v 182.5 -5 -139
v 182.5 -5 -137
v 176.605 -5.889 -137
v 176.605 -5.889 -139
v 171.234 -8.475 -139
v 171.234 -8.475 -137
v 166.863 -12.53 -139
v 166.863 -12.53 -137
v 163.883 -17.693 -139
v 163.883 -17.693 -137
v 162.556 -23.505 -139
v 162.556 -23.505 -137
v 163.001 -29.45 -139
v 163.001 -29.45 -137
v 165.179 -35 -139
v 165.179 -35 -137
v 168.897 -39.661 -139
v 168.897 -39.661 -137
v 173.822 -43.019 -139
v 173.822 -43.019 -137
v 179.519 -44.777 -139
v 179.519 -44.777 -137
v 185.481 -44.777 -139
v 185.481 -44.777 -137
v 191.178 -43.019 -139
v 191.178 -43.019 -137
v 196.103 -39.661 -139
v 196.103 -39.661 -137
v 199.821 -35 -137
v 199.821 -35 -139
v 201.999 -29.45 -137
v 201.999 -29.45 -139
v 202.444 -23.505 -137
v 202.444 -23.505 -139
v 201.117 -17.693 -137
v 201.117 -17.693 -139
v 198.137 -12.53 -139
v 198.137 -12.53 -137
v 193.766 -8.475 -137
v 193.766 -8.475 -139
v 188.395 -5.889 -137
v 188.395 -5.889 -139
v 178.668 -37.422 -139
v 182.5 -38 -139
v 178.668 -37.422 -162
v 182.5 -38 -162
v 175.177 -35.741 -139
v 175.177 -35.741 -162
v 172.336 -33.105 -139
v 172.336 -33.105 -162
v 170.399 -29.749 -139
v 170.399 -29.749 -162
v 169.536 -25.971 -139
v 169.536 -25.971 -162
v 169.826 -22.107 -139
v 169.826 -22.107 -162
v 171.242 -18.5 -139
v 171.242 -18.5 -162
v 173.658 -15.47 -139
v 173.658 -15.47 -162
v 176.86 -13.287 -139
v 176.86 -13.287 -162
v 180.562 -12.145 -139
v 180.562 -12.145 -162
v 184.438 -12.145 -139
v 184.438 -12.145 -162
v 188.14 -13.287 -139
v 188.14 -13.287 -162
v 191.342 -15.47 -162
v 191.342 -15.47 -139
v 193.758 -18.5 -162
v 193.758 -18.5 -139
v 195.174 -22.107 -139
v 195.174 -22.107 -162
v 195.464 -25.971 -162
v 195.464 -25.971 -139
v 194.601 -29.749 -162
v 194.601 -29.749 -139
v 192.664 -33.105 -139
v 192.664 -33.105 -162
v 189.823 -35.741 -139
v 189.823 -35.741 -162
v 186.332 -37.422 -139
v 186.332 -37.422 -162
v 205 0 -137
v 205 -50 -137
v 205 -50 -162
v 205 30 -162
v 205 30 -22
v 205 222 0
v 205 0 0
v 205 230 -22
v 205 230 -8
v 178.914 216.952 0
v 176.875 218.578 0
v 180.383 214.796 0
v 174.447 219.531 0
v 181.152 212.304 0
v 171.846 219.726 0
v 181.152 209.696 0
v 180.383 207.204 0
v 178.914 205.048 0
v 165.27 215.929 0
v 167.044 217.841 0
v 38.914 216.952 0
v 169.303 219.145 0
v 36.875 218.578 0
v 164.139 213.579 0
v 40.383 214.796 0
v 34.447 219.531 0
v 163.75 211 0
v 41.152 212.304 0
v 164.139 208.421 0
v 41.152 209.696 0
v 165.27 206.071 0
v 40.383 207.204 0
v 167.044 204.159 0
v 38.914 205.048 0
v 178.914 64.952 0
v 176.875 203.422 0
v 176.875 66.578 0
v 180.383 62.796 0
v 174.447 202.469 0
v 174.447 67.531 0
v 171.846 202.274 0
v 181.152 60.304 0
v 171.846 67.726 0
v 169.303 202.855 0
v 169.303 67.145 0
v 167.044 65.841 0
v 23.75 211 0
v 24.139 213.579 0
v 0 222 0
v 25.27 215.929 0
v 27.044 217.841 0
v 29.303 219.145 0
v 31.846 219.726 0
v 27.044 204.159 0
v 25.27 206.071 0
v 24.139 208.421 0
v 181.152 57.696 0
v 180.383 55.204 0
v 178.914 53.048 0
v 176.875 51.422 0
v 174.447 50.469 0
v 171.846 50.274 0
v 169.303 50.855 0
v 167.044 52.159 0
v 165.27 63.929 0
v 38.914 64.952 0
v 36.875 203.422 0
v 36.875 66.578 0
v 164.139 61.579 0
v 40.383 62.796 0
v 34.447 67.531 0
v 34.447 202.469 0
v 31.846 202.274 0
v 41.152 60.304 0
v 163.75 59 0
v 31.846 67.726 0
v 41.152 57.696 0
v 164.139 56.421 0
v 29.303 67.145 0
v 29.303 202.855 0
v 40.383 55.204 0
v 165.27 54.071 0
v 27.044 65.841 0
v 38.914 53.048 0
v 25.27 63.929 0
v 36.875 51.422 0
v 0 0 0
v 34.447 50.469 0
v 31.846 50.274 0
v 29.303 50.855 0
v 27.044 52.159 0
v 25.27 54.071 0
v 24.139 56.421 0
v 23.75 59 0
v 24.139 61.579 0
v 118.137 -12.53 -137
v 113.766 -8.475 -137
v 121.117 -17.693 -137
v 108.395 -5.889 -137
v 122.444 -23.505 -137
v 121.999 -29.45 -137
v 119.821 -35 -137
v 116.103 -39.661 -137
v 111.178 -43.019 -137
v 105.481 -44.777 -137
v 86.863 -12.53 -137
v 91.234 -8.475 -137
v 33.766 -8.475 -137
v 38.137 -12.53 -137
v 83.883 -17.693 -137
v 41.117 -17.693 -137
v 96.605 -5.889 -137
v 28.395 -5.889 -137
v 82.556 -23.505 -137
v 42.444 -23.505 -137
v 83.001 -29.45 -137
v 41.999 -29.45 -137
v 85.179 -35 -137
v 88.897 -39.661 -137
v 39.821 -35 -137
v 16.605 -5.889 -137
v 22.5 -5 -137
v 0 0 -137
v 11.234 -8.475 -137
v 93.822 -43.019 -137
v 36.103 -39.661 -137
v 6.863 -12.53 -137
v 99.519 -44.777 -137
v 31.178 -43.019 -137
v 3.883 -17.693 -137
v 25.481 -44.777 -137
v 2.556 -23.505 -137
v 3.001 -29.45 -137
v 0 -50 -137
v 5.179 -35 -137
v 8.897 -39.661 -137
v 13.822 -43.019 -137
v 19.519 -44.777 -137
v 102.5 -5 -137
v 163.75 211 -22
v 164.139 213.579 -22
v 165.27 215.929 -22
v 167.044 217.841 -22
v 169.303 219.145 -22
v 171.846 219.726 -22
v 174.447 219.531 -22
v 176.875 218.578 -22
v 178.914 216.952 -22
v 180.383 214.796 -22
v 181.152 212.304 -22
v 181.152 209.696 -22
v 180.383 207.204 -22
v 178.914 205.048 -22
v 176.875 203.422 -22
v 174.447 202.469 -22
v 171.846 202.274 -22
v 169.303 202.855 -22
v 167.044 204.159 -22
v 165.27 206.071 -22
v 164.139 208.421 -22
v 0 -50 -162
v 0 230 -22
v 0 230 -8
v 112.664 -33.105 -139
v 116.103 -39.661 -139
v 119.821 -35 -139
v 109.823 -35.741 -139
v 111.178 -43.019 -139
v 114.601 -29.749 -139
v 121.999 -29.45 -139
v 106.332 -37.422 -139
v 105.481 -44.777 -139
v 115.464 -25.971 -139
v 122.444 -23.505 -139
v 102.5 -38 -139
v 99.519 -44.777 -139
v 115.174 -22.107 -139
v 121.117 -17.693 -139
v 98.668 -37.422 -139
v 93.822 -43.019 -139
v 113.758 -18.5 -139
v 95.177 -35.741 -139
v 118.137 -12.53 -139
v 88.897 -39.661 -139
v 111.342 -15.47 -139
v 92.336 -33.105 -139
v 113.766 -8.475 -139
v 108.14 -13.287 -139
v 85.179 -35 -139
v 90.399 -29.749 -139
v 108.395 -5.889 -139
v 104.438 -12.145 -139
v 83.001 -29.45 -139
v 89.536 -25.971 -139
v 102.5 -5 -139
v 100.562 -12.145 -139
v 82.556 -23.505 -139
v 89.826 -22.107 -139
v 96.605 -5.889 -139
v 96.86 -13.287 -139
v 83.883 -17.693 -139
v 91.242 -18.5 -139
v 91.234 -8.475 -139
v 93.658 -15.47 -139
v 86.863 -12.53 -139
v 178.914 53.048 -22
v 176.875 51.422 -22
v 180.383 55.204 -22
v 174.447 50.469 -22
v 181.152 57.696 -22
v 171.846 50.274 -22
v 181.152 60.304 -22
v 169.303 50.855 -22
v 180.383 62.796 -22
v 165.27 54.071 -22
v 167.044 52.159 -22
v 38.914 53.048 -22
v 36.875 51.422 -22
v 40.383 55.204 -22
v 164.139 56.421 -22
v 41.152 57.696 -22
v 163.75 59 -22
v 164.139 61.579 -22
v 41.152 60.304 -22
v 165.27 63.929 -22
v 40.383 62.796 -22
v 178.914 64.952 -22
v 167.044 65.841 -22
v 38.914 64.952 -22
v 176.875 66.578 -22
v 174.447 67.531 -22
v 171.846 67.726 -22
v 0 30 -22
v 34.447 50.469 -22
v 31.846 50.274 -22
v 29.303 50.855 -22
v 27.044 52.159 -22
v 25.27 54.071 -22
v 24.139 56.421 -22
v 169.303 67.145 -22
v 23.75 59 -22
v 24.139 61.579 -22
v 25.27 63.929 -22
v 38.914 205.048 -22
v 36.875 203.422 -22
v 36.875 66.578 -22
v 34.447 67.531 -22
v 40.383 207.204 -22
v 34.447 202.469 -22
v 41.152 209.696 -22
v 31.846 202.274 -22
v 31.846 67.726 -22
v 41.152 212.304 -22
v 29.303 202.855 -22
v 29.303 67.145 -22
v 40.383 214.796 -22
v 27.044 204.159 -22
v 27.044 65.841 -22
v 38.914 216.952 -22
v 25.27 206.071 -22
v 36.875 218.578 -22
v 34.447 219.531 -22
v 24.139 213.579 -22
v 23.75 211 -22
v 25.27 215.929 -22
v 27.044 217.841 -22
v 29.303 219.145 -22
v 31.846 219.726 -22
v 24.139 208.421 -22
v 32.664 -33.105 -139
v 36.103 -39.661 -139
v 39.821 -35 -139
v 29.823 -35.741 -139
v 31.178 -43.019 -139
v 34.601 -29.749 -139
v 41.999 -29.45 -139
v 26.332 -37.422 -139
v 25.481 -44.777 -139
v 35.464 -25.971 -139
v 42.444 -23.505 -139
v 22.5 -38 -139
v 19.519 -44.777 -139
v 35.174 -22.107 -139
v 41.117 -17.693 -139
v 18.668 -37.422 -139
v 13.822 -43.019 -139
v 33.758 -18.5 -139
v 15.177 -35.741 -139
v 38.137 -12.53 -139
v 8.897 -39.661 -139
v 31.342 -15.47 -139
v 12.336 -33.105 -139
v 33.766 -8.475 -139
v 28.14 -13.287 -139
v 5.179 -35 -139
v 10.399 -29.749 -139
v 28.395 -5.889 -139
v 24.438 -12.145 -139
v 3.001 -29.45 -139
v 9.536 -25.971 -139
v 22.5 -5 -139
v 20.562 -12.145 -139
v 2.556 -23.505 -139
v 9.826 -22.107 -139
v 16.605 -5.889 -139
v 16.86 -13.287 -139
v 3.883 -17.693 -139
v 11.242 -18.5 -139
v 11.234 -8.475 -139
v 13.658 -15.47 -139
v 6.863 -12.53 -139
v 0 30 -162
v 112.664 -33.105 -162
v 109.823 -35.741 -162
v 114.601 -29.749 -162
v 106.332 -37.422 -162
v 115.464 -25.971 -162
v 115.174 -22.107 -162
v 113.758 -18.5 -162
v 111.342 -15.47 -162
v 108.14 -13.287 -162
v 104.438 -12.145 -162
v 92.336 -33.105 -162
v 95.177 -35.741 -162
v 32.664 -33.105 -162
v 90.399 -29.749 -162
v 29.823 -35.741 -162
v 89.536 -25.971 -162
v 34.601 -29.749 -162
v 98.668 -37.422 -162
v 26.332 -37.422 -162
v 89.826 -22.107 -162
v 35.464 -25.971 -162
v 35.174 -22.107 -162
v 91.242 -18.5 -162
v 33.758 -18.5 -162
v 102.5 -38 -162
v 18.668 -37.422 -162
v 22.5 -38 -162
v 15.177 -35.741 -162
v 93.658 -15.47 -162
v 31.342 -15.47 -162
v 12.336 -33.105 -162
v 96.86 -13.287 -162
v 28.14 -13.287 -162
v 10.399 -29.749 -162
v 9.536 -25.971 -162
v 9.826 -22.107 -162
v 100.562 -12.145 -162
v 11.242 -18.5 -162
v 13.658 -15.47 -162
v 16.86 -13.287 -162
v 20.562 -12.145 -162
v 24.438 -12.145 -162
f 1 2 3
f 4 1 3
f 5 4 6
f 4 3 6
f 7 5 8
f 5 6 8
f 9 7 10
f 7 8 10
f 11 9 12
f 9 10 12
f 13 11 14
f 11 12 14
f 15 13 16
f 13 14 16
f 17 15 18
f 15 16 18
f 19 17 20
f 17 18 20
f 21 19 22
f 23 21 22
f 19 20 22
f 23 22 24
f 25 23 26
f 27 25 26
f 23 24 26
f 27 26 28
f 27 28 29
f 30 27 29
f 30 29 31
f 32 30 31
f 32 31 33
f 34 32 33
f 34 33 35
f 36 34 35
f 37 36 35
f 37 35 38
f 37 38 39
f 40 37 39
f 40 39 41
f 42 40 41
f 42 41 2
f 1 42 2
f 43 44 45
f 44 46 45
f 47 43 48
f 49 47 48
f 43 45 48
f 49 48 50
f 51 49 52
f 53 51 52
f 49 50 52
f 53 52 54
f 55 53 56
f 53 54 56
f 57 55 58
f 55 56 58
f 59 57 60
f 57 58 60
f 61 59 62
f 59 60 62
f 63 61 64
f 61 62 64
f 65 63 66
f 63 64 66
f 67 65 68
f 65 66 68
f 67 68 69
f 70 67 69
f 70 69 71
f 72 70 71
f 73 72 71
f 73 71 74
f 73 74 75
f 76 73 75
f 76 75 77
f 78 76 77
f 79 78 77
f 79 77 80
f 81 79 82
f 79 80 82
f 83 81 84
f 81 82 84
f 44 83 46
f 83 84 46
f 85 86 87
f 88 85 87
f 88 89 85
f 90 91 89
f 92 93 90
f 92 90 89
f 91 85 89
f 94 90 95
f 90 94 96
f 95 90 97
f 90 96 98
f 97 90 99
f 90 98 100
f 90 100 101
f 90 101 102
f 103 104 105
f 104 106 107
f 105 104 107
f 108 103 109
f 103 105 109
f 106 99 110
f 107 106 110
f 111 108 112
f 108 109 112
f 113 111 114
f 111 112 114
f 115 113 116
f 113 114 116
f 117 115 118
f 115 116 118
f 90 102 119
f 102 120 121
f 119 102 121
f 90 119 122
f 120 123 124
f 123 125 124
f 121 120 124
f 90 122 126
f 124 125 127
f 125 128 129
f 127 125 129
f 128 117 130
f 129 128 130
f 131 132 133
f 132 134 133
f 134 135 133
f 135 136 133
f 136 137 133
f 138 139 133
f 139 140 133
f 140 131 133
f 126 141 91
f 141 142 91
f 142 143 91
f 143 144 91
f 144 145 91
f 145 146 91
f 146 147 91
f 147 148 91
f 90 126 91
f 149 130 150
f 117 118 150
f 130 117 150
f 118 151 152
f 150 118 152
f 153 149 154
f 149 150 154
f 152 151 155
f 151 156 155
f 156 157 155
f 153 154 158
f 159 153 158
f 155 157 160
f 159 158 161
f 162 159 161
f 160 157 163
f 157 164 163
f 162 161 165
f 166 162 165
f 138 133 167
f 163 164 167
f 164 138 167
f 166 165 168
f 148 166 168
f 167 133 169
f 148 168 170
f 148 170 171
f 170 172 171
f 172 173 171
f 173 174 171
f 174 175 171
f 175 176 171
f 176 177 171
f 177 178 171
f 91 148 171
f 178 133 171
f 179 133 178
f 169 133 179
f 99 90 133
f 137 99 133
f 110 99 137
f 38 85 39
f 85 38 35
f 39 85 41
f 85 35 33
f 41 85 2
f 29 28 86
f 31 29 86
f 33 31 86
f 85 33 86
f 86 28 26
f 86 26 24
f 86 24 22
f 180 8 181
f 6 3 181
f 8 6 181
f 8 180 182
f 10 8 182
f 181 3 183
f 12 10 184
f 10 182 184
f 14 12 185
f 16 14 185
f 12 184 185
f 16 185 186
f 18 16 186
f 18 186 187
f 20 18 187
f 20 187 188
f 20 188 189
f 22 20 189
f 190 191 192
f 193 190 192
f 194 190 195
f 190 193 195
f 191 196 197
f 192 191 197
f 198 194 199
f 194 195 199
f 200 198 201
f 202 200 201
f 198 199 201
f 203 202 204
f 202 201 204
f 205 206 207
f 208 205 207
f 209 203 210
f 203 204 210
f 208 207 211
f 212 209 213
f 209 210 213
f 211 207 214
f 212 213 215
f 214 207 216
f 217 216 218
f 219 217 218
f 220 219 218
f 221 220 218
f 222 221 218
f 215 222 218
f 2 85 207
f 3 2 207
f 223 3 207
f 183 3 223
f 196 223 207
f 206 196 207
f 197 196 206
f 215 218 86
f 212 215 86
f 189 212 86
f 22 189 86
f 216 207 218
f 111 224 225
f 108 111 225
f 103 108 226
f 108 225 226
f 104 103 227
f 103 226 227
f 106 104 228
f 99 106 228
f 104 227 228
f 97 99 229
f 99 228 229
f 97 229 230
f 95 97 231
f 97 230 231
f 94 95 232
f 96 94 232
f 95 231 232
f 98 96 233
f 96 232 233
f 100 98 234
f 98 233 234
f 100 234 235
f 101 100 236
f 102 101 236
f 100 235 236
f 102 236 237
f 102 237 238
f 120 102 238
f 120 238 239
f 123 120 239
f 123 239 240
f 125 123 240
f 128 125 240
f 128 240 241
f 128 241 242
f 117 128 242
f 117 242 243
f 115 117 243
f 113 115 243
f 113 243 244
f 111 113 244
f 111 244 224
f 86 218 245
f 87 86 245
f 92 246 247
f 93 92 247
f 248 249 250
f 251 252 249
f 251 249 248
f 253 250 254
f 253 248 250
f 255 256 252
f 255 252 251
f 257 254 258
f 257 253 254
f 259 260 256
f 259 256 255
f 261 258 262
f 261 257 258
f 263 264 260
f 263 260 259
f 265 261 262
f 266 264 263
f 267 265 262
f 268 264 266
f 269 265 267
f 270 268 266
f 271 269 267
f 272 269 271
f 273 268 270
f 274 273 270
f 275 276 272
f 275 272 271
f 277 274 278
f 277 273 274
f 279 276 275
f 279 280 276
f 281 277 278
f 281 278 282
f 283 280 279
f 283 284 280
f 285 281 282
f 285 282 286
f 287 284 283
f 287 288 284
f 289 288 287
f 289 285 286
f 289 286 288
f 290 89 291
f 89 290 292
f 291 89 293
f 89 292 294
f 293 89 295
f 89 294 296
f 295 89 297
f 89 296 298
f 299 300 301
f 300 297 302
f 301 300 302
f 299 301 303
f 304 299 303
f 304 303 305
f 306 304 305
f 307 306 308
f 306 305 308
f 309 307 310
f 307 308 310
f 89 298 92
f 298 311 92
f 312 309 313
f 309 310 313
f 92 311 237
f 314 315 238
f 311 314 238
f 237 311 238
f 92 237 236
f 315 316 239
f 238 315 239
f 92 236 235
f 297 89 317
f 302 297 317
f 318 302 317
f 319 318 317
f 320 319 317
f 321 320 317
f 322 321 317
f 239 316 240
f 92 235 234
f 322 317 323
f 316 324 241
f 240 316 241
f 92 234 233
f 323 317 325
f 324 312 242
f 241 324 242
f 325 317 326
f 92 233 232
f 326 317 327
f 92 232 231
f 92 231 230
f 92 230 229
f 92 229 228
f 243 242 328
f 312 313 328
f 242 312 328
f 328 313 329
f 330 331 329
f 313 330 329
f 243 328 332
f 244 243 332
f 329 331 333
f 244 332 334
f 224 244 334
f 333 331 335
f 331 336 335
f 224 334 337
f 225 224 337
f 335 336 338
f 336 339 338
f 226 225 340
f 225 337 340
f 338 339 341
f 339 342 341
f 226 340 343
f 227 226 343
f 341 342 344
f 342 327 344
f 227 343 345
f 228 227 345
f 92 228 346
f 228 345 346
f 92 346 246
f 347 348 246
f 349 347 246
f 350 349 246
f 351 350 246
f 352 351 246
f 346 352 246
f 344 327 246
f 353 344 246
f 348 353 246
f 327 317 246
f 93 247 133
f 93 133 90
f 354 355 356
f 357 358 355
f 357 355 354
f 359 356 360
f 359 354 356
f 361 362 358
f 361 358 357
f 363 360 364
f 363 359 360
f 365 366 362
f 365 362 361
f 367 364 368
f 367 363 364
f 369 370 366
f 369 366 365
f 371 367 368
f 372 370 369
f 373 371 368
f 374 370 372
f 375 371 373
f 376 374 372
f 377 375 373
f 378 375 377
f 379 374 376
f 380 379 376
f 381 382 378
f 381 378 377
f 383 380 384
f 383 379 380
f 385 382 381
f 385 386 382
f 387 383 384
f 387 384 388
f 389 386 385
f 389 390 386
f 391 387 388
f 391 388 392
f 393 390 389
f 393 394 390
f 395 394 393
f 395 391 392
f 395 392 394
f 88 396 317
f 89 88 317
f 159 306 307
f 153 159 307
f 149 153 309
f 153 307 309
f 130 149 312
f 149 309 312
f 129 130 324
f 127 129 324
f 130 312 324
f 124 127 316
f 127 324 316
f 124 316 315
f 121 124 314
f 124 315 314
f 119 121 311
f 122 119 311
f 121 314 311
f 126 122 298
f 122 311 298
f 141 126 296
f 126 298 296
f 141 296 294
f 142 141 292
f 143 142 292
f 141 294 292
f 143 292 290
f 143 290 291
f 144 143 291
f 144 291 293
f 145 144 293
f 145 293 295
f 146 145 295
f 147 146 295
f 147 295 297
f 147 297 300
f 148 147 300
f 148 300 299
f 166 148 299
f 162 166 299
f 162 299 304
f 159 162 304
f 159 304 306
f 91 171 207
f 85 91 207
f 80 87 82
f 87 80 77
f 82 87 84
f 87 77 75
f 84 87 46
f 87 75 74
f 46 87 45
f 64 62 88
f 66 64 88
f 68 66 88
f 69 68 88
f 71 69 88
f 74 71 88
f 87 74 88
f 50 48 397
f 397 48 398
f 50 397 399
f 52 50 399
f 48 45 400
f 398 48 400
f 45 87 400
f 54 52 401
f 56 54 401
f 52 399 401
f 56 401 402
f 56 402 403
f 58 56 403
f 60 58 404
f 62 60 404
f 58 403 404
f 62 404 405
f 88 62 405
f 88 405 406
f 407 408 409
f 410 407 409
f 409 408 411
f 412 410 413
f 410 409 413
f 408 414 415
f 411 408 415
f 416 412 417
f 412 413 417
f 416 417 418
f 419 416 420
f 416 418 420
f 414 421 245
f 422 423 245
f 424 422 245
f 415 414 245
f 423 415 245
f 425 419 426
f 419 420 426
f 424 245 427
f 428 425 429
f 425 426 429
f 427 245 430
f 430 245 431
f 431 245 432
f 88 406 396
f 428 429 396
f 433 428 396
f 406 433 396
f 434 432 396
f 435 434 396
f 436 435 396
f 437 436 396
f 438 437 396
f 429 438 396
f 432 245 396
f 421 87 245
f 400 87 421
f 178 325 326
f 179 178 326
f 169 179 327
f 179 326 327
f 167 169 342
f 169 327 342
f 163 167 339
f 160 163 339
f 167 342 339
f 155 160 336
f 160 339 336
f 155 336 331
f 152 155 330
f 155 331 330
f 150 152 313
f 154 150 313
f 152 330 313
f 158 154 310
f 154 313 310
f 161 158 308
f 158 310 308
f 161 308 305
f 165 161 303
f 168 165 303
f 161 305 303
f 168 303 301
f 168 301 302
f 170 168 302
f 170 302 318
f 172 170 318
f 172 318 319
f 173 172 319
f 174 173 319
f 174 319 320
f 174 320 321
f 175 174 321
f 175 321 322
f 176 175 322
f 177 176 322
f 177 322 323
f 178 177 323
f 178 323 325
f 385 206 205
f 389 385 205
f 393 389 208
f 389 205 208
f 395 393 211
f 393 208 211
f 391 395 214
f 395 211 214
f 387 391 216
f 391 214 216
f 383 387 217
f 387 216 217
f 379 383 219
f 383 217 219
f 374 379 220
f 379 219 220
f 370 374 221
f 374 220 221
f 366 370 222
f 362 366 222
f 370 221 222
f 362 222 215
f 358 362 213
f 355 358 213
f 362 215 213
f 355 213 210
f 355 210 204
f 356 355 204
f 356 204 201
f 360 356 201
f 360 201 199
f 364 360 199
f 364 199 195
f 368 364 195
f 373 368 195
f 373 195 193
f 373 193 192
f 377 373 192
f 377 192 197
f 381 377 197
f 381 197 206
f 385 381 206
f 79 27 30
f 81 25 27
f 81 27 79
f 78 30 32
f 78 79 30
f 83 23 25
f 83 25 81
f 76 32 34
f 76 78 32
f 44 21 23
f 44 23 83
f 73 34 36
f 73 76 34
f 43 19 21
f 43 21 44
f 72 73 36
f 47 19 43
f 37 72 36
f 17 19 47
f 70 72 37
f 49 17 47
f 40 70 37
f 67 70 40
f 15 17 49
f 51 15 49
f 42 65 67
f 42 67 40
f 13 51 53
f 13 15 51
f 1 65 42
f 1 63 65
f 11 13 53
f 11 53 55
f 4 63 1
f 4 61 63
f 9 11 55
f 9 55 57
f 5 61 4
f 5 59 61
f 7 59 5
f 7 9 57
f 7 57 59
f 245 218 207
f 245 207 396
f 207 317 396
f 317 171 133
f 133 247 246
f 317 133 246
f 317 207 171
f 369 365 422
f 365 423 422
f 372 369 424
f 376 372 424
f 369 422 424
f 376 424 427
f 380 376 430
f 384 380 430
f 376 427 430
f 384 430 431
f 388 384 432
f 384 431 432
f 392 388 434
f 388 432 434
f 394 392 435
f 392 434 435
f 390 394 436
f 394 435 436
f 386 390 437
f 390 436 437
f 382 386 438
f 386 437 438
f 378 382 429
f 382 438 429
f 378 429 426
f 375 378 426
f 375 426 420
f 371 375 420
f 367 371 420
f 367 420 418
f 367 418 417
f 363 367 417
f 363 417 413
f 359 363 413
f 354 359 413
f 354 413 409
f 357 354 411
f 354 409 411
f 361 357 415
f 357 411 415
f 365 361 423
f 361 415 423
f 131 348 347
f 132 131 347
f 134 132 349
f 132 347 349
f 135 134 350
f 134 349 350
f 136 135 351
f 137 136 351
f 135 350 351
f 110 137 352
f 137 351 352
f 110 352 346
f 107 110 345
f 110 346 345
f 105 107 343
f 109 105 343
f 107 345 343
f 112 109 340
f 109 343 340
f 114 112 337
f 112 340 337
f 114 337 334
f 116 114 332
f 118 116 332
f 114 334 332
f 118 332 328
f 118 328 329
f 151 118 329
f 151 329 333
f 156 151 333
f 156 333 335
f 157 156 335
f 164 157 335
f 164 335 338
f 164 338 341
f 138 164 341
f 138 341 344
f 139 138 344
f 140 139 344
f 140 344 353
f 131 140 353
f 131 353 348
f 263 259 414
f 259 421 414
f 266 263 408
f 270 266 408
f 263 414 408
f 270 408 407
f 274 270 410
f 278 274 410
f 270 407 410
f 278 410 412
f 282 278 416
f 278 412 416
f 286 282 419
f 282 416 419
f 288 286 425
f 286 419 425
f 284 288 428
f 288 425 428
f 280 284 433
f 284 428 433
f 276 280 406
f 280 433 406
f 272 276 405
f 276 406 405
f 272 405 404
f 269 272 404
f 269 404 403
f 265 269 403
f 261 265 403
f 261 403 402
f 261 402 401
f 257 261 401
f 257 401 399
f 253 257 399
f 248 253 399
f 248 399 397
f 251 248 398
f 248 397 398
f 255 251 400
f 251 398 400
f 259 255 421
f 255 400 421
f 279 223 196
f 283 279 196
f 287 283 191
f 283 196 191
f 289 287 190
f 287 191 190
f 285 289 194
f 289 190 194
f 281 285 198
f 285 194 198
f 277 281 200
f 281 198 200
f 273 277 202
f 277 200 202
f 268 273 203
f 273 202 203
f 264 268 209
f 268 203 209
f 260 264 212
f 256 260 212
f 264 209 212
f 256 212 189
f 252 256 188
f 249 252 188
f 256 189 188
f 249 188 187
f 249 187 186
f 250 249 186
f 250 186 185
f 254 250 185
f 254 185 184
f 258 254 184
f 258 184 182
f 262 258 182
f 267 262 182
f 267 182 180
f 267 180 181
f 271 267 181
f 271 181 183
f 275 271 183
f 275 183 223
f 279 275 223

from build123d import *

# Parameters (mm, degrees)
EXTRUDE_1_DEPTH                 = 205
HOLE_WIZARD_M20_1_D             = 17.5
PATTERN_LINEAR_1_COUNT          = 2
PATTERN_LINEAR_1_PITCH          = 140
PATTERN_LINEAR_1_COUNT_DIR2     = 2
PATTERN_LINEAR_1_PITCH_DIR2     = 152
HOLE_WIZARD_M20_1_2_D           = 26
HOLE_WIZARD_M20_1_2_CBORE_D     = 40
HOLE_WIZARD_M20_1_2_CBORE_DEPTH = 2
PATTERN_LINEAR_2_COUNT          = 3
PATTERN_LINEAR_2_PITCH          = 80
CHAMFER_1_SIZE                  = 8


with BuildPart() as part:
    # 草图1 → 凸台-拉伸1 (new body)
    with BuildSketch(Plane(origin=(0, 0, 0), x_dir=(0, 0, -1), z_dir=(1, 0, 0))):
        Polygon((0, 0), (137, 0), (137, -50), (162, -50), (162, 30), (22, 30), (22, 230), (0, 230), align=None)
    extrude(amount=EXTRUDE_1_DEPTH)

    # Hole Wizard M20 _1 (through all)
    with Locations(Plane(origin=(32.5, 211, 0), x_dir=(1, 0, 0), z_dir=(0, 0, 1))):
        with Locations((0, 0)):
            hole_wizard_m20_1 = Hole(HOLE_WIZARD_M20_1_D / 2)

    # 阵列(线性)1: Hole Wizard M20 _1 2 × 2
    with Locations(*[(i * PATTERN_LINEAR_1_PITCH, -j * PATTERN_LINEAR_1_PITCH_DIR2, 0) for i in range(PATTERN_LINEAR_1_COUNT) for j in range(PATTERN_LINEAR_1_COUNT_DIR2) if (i, j) != (0, 0)]):
        add(hole_wizard_m20_1, mode=Mode.SUBTRACT)

    # Hole Wizard M20 _1 2 (through all)
    with Locations(Plane(origin=(22.5, -25, -137), x_dir=(0, 1, 0), z_dir=(0, 0, 1))):
        with Locations((0, 0)):
            hole_wizard_m20_1_2 = CounterBoreHole(HOLE_WIZARD_M20_1_2_D / 2, HOLE_WIZARD_M20_1_2_CBORE_D / 2, HOLE_WIZARD_M20_1_2_CBORE_DEPTH)

    # 阵列(线性)2: Hole Wizard M20 _1 2 ×3
    with Locations(*[(i * PATTERN_LINEAR_2_PITCH, 0, 0) for i in range(1, PATTERN_LINEAR_2_COUNT)]):
        add(hole_wizard_m20_1_2, mode=Mode.SUBTRACT)

    # 倒角1
    chamfer_1_edges = [part.edges().sort_by_distance(p)[0] for p in [
        (102.5, 230, 0),
    ]]
    chamfer(chamfer_1_edges, length=CHAMFER_1_SIZE)


solid = part.part
